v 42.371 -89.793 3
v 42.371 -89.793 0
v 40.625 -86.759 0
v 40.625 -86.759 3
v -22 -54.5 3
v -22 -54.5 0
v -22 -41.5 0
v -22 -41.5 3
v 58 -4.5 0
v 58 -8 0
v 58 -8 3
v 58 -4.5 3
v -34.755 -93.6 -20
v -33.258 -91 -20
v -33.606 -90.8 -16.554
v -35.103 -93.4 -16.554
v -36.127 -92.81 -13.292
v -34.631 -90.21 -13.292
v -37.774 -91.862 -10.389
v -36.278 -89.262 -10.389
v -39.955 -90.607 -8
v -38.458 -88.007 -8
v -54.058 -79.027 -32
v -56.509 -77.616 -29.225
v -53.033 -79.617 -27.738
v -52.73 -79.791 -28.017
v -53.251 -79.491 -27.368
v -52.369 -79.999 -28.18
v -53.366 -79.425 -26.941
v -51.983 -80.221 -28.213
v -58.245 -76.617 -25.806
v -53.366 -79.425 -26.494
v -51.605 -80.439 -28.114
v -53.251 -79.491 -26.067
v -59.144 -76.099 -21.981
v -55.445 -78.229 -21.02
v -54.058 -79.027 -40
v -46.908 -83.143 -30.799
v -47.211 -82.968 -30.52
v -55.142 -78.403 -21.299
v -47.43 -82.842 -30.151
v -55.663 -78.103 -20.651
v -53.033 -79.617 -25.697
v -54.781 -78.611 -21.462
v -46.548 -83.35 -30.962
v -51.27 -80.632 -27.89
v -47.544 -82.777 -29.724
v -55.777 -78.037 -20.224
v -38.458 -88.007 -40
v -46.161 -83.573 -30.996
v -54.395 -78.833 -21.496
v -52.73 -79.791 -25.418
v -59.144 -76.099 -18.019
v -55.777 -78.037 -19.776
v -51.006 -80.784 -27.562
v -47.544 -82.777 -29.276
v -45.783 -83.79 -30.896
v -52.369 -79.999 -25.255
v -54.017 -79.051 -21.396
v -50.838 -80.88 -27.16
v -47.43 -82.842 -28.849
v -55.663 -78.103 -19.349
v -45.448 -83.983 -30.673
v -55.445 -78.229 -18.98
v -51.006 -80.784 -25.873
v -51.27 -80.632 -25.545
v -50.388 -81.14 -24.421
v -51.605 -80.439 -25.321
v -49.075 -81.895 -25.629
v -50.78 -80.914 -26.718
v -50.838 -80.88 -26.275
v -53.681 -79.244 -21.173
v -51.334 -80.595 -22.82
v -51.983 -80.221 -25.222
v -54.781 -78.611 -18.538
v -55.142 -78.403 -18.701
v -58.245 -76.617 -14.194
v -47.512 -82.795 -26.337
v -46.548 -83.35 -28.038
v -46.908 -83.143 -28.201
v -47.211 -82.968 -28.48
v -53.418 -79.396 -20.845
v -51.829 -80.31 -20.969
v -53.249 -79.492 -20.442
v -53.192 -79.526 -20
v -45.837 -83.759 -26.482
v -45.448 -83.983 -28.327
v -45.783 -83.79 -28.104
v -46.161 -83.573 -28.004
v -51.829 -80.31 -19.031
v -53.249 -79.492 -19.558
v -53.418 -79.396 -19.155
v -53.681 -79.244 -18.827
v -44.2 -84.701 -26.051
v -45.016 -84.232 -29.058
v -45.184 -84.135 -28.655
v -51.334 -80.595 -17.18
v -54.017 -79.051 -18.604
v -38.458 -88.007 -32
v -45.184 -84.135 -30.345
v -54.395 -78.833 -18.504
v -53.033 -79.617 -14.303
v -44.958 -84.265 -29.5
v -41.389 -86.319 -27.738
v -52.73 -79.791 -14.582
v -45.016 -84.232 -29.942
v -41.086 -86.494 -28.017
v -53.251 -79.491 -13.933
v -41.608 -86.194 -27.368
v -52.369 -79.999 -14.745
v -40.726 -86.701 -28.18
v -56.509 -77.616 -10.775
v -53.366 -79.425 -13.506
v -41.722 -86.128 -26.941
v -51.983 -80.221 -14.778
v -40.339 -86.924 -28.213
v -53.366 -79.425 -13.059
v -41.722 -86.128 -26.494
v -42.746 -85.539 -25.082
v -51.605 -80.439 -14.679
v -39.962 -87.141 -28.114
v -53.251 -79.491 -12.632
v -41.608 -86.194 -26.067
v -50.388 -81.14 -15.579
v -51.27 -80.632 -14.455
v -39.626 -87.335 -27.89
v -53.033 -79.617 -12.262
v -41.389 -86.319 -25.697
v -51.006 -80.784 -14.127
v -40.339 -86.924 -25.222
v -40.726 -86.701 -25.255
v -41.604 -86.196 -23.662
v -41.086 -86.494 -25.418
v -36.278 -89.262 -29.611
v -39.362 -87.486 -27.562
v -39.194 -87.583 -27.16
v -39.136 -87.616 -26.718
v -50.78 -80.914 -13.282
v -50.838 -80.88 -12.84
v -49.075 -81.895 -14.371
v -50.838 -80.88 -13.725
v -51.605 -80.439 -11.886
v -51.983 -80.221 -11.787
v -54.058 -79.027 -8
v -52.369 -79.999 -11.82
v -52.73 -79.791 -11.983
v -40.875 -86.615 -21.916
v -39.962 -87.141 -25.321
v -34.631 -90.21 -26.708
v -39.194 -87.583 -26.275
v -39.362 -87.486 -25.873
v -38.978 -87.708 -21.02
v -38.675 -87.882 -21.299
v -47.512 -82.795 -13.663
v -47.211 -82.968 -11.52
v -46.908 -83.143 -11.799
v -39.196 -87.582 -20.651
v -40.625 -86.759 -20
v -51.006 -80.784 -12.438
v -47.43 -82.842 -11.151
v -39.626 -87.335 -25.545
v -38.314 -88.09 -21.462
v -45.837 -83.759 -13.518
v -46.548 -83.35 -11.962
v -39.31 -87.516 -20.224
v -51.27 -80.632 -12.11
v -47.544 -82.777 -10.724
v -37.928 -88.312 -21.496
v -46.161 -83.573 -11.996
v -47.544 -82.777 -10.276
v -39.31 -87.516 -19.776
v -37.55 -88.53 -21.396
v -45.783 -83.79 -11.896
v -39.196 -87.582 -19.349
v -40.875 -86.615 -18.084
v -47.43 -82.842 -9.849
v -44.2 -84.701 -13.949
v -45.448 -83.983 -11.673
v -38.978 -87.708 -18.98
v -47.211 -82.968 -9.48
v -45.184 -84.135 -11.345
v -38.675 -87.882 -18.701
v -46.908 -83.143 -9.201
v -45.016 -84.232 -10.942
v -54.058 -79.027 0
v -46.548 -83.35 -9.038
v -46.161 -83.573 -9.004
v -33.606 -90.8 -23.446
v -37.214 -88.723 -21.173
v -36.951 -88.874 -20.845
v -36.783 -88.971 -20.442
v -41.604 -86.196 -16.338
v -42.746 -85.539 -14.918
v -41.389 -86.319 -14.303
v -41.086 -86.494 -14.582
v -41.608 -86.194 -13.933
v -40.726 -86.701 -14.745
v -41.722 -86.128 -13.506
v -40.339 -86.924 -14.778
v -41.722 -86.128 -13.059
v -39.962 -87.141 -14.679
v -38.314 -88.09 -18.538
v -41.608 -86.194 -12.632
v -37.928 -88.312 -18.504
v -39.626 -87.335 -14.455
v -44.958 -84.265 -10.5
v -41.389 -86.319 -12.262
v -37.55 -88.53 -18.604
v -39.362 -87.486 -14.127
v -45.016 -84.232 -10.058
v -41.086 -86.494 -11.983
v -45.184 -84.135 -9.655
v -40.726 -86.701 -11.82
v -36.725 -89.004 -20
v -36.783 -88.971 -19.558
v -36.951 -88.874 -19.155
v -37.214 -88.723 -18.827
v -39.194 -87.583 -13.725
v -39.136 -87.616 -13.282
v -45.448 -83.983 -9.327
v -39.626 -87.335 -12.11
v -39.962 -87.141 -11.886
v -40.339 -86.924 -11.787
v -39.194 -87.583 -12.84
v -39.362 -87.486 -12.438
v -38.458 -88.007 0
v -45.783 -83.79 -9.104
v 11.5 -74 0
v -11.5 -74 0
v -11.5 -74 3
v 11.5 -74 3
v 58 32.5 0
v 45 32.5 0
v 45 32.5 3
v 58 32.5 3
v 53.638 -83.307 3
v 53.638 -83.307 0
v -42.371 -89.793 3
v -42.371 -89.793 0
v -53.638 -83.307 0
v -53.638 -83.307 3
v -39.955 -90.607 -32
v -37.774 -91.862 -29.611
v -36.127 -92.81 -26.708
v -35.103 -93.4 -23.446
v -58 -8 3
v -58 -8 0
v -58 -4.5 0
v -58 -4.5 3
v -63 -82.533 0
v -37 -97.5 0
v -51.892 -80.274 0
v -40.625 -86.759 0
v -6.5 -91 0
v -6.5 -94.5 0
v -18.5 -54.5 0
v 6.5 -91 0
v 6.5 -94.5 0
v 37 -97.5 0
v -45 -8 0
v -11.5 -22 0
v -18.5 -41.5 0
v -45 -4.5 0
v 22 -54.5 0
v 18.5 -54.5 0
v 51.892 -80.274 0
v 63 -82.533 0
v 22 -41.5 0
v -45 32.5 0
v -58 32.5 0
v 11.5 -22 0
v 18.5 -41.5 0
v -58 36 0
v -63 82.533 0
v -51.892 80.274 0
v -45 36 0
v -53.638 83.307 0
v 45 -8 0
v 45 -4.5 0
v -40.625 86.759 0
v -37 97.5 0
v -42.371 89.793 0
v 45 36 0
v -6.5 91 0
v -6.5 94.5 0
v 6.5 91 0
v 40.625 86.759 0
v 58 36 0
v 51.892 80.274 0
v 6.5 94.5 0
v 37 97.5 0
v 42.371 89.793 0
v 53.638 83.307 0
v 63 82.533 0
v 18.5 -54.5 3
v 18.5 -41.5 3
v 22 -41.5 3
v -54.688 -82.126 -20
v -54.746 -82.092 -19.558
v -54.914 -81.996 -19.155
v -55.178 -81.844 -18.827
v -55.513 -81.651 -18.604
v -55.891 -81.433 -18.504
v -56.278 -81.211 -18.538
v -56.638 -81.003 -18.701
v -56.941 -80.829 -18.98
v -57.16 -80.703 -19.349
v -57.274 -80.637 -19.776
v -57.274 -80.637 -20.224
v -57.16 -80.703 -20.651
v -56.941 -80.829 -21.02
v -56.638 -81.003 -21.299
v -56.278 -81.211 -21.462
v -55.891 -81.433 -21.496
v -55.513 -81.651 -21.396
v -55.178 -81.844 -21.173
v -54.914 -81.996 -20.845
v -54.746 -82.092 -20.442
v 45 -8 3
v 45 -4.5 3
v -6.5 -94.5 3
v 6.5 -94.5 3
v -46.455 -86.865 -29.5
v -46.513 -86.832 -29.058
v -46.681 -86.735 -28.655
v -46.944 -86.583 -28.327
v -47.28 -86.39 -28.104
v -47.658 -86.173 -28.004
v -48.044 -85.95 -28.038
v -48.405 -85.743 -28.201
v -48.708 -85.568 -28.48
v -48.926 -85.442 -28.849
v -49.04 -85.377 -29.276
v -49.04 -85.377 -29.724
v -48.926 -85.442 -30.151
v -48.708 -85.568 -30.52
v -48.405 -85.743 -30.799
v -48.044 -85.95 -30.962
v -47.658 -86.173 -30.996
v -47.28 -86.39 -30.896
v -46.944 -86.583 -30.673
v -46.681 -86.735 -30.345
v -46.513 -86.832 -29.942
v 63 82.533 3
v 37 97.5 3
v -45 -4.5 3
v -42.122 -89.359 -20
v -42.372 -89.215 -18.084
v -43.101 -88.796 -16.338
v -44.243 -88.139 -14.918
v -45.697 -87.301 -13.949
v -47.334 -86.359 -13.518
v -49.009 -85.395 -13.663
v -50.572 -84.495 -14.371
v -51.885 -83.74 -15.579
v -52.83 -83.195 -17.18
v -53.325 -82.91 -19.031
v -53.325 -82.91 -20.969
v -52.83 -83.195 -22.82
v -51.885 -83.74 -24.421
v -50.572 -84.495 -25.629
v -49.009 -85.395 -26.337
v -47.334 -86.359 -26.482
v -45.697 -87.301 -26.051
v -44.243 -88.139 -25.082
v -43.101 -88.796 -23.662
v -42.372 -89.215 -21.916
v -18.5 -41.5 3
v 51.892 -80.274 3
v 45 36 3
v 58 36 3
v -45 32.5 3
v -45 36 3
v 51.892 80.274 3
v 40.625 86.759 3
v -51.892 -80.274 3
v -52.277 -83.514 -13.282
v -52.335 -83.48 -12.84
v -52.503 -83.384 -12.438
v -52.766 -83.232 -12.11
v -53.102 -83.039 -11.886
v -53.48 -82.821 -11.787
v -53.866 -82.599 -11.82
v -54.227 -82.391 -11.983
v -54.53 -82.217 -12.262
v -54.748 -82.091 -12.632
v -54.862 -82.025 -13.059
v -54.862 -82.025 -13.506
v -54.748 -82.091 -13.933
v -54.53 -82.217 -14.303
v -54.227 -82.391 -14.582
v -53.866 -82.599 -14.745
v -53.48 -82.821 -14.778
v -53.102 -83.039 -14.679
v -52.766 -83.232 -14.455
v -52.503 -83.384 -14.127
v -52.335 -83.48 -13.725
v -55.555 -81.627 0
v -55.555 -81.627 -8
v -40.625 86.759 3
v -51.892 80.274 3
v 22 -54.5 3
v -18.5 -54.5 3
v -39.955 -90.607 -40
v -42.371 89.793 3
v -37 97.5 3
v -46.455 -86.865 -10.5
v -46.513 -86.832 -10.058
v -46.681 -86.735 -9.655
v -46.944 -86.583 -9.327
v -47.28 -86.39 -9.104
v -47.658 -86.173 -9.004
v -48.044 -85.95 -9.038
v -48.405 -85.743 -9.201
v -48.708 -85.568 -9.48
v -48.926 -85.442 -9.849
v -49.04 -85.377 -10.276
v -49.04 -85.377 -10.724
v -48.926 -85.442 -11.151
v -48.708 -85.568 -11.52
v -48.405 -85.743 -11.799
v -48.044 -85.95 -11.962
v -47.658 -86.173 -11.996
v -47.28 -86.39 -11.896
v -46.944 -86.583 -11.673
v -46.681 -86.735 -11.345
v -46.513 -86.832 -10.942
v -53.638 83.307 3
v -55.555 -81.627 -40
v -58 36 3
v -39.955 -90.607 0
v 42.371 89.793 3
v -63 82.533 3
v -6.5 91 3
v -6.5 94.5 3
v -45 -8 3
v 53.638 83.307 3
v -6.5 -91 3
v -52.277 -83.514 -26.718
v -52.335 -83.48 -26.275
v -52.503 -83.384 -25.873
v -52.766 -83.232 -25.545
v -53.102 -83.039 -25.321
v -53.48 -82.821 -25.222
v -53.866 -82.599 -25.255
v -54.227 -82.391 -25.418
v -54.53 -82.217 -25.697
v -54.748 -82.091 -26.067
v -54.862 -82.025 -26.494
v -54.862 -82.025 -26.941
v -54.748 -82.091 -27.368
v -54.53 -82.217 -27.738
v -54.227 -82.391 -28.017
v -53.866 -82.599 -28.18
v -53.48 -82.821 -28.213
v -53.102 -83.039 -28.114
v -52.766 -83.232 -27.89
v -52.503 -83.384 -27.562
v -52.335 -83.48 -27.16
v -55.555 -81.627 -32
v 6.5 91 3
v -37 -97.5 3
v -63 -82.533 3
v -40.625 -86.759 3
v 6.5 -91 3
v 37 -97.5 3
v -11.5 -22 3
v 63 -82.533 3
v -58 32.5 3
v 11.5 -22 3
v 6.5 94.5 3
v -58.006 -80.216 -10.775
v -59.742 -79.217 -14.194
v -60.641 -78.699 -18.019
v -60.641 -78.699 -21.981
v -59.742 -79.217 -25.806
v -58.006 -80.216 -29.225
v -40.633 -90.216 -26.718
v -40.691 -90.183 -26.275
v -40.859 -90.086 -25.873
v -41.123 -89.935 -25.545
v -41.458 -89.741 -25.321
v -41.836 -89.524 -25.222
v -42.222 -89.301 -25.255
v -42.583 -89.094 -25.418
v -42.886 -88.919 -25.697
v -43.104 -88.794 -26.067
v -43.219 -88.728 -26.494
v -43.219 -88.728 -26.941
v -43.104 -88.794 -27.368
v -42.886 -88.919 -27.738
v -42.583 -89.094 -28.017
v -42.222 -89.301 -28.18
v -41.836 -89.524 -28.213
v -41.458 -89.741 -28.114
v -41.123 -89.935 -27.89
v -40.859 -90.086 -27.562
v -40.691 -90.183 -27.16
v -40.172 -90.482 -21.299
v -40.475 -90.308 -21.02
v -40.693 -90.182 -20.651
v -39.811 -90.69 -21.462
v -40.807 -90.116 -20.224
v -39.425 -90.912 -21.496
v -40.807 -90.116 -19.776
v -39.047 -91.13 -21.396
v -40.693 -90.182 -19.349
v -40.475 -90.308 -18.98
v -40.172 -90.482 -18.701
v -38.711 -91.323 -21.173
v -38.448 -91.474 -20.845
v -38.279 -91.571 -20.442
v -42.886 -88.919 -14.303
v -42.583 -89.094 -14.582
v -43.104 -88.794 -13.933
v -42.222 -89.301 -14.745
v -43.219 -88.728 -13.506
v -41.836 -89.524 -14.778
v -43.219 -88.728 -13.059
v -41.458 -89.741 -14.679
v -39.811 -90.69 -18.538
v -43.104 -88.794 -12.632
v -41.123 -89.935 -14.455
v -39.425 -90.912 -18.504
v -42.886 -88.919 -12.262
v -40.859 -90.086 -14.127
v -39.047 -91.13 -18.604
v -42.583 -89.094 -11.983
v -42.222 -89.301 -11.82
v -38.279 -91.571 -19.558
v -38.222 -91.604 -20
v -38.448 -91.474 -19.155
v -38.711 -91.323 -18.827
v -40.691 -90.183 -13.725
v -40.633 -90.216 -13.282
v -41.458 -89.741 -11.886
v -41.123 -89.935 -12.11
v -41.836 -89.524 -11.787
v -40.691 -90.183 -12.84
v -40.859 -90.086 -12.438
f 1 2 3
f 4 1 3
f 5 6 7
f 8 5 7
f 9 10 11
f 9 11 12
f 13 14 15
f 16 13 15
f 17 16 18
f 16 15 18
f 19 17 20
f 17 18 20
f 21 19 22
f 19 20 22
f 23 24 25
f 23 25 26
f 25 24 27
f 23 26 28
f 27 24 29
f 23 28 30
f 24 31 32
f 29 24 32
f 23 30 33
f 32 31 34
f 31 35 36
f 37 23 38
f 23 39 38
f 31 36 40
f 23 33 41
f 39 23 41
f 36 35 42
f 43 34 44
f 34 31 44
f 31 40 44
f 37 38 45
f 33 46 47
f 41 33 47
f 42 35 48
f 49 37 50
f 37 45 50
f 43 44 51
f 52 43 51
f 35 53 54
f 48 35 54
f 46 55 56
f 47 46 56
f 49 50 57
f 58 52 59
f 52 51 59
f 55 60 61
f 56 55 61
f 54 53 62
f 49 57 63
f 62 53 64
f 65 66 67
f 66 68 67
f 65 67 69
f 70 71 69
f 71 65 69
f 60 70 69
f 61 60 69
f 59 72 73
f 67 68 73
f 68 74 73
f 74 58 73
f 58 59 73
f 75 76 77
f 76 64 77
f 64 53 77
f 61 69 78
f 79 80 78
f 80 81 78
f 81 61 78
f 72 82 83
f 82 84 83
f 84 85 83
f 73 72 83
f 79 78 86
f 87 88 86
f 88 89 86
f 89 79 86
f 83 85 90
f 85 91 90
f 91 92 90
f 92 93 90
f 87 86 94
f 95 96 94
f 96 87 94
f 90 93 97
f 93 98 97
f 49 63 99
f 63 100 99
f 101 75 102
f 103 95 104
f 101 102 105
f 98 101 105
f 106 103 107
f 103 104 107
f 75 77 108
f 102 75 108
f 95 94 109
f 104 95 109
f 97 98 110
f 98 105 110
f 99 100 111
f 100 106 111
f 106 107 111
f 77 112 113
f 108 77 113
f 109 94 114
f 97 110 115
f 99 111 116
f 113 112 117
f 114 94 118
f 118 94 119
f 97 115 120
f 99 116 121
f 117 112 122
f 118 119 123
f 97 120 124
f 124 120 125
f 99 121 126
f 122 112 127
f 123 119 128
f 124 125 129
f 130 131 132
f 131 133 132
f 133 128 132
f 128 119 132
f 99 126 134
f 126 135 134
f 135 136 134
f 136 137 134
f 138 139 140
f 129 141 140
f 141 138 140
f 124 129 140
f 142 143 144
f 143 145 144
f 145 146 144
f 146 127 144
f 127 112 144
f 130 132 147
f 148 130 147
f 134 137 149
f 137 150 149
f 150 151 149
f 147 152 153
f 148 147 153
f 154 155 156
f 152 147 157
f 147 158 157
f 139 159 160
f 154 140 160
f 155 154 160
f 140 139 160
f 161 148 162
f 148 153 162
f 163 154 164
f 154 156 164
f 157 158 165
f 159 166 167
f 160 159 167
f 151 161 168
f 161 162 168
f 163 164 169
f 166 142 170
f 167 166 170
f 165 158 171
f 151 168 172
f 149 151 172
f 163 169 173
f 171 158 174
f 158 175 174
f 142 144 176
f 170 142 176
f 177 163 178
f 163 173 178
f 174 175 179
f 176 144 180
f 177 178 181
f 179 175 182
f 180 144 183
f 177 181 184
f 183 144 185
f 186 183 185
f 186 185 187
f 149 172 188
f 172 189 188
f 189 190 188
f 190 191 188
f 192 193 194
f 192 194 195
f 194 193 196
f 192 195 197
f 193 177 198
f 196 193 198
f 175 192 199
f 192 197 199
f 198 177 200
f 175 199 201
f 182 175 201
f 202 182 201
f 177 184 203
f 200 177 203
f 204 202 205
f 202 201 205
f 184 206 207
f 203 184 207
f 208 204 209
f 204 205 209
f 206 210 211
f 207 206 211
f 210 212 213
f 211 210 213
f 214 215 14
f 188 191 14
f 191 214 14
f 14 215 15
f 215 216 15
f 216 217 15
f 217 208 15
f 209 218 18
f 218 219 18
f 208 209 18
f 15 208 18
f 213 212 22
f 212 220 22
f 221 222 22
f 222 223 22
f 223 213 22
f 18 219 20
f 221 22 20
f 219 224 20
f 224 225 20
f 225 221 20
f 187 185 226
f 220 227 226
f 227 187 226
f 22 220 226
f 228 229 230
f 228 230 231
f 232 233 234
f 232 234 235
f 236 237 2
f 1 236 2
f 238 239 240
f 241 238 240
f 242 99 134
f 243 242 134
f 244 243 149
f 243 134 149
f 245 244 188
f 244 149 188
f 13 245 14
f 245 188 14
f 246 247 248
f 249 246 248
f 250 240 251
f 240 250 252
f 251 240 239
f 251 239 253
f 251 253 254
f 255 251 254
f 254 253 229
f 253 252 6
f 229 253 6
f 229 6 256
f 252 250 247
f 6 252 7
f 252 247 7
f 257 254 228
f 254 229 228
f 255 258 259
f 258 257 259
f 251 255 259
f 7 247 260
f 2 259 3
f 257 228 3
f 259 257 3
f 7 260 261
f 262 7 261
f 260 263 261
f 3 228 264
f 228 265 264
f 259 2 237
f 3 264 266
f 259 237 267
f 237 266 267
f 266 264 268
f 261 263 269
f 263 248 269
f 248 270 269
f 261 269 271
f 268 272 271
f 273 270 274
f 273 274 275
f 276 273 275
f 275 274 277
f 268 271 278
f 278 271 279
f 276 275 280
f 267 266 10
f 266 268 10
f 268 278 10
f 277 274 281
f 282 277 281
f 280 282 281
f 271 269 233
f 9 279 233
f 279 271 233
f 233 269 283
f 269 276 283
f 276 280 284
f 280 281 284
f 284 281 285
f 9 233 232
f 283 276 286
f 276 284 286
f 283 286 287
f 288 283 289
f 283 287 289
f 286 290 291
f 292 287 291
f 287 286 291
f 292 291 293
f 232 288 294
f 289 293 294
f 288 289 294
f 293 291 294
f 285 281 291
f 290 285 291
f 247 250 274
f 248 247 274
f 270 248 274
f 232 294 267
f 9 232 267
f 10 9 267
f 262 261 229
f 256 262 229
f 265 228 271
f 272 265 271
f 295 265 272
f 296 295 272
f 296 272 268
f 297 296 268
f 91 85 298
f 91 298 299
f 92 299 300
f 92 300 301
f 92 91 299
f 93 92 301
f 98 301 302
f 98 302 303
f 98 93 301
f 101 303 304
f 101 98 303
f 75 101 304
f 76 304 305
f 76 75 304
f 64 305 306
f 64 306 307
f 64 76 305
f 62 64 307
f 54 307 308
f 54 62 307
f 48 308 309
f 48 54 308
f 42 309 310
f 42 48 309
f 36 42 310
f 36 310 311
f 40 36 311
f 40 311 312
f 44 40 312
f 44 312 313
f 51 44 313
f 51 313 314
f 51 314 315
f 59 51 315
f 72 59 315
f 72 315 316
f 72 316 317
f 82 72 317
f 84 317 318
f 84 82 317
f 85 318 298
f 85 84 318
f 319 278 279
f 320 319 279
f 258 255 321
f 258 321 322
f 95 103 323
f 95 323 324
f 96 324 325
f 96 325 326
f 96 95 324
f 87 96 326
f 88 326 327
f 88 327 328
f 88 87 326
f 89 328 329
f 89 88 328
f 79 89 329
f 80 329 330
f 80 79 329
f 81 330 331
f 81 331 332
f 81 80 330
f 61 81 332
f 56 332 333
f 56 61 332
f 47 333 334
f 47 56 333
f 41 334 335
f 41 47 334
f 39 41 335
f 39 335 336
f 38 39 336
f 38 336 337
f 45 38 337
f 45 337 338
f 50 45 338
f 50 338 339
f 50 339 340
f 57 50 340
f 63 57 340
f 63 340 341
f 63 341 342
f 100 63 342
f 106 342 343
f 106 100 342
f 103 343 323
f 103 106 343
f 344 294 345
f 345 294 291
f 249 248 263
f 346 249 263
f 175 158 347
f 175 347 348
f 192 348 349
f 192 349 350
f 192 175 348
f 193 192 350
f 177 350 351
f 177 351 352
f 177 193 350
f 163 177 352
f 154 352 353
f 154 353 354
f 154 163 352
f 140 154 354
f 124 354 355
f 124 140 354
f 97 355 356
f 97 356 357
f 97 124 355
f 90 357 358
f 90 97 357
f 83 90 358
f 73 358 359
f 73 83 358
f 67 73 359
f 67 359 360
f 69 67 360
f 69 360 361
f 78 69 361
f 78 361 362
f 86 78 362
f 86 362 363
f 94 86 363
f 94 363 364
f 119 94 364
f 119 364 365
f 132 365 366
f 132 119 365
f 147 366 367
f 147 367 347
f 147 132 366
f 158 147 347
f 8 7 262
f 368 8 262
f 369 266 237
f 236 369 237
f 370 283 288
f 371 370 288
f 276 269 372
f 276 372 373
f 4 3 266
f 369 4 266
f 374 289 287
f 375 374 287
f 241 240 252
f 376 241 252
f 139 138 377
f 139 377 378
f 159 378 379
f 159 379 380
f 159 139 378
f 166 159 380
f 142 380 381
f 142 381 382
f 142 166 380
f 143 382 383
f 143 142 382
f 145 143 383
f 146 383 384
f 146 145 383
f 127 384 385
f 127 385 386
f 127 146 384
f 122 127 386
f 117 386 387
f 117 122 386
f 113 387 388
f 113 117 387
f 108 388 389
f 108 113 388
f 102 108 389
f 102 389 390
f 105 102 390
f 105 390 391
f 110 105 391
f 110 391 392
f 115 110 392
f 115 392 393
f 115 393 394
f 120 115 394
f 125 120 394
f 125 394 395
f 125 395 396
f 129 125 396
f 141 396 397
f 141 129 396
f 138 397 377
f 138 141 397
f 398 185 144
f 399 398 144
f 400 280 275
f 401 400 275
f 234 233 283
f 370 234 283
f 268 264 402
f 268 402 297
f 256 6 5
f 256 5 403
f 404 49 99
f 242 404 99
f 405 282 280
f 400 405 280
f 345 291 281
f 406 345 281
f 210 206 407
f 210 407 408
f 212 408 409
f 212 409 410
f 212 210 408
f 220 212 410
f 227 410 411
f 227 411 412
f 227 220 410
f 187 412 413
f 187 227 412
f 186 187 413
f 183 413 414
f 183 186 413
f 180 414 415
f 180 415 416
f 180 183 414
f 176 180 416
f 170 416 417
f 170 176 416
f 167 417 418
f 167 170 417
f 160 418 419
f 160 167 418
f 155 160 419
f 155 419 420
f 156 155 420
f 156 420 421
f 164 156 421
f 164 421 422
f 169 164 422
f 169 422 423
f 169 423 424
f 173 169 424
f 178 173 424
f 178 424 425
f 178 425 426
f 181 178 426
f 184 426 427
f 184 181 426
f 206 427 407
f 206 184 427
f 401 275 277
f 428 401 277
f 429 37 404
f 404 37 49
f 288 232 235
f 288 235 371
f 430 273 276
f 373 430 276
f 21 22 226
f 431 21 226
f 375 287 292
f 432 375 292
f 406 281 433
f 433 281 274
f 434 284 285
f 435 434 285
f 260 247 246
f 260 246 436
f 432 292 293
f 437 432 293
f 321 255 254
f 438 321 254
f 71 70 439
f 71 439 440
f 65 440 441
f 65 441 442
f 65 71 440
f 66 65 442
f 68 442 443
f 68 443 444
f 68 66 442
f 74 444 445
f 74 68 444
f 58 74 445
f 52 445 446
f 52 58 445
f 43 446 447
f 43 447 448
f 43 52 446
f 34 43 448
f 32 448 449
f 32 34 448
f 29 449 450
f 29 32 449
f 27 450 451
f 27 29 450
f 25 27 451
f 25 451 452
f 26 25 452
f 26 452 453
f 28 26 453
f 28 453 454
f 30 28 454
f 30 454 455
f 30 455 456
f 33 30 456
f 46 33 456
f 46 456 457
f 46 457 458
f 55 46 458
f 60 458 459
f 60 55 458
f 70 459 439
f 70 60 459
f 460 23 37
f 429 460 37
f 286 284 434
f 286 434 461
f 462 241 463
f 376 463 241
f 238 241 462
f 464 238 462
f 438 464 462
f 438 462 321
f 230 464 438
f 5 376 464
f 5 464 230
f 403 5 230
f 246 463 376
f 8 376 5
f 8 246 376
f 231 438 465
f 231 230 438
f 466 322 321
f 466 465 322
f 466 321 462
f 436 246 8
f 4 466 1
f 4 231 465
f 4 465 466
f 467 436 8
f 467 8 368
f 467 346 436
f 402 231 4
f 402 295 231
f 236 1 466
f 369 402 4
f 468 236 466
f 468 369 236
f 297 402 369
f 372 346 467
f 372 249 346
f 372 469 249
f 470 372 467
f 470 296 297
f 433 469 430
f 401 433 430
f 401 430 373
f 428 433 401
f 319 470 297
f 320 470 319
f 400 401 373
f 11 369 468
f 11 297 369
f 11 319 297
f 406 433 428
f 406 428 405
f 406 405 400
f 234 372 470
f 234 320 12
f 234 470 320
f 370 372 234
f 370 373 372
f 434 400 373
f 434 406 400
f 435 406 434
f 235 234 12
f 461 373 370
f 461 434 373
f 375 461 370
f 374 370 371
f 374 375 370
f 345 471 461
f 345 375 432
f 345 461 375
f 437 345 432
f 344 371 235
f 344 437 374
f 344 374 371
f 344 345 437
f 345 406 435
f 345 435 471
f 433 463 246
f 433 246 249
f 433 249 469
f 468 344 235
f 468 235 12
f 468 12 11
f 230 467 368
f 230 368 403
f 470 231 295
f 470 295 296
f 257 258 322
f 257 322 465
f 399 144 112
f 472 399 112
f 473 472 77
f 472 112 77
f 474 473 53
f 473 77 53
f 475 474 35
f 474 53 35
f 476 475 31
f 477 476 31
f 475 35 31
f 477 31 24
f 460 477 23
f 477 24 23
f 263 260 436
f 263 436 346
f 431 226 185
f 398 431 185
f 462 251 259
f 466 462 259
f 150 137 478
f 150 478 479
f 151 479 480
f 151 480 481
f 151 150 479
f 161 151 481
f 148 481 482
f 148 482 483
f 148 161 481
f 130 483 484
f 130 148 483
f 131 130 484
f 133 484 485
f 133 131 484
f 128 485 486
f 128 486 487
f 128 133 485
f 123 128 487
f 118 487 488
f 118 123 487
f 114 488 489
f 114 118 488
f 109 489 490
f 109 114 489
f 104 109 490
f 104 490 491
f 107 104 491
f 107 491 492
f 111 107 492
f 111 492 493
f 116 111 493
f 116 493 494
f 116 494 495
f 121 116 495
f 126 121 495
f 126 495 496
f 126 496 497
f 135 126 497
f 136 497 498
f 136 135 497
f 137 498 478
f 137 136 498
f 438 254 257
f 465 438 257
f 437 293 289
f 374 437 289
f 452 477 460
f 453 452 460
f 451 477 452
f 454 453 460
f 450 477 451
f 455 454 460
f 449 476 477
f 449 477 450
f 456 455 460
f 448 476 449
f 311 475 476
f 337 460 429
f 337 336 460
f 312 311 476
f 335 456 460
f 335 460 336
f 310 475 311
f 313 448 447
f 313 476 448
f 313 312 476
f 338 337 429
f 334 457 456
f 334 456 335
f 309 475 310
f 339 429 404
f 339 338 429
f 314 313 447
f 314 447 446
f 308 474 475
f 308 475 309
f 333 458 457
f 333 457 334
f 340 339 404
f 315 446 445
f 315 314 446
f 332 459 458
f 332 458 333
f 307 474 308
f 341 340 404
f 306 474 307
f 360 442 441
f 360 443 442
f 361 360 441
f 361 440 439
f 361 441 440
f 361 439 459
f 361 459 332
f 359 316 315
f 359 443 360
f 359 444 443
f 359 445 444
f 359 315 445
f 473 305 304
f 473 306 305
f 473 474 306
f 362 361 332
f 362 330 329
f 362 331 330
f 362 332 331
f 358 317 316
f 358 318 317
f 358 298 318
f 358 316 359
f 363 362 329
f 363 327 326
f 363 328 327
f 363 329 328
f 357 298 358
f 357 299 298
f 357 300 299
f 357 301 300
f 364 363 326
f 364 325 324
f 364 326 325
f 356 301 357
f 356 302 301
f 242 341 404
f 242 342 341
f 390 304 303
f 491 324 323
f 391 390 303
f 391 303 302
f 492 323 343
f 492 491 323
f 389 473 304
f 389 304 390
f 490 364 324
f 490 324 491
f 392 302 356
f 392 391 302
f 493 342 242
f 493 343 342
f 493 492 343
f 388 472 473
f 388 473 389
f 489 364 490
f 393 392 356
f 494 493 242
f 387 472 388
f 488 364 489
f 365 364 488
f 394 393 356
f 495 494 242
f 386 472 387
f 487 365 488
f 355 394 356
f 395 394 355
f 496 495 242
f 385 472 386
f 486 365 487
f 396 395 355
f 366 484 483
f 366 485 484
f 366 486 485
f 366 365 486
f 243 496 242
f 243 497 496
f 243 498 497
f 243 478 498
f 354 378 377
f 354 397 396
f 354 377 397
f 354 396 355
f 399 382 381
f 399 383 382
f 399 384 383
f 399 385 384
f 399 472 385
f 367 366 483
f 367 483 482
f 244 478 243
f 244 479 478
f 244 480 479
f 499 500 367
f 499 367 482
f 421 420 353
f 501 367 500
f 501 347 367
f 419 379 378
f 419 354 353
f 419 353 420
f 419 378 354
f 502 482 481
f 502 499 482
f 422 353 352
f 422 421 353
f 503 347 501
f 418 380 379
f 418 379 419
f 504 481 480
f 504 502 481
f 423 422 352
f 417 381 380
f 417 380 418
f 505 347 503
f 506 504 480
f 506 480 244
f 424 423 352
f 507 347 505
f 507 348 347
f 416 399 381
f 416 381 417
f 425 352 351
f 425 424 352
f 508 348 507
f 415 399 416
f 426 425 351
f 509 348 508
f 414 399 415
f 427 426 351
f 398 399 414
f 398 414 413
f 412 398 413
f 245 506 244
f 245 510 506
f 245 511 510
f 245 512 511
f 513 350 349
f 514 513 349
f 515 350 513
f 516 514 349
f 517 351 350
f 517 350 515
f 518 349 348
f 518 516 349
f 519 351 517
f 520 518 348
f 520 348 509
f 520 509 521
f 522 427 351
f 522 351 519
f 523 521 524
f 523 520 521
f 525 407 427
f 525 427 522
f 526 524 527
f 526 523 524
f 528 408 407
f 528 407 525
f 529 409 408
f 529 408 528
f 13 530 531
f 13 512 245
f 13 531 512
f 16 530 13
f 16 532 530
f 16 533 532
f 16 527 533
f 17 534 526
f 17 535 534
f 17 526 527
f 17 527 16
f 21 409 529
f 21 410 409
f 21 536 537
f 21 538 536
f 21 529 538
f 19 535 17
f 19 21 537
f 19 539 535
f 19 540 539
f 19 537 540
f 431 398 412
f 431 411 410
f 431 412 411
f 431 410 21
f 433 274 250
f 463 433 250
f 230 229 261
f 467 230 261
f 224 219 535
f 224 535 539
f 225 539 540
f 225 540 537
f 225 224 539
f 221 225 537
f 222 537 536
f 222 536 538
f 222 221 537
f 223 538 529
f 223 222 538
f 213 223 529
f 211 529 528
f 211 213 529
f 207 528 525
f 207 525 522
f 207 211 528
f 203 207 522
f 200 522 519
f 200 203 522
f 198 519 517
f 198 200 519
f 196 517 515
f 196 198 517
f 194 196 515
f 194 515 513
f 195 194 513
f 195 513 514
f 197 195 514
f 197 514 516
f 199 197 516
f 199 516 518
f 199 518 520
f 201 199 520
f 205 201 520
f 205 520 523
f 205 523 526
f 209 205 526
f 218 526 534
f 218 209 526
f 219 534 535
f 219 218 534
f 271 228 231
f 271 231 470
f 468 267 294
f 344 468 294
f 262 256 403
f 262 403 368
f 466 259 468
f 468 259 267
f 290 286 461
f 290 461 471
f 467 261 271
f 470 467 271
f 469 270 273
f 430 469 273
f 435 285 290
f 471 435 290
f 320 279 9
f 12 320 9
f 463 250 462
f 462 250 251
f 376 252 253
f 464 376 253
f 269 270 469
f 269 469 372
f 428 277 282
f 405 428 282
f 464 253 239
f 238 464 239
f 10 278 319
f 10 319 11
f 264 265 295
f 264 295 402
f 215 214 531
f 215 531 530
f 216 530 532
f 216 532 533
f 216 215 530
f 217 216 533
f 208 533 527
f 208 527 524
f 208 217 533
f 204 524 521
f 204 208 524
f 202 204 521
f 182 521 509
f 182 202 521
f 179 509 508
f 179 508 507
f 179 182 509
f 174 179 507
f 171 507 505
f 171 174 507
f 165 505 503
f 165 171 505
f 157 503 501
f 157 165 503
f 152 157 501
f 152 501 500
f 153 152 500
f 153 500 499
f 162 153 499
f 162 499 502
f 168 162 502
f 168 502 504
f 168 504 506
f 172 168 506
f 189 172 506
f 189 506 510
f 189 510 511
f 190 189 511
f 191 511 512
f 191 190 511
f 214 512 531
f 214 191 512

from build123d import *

# Parameters (mm, degrees)
F0_W     = 13
F0_H     = 3.5
F0_W_2   = 3.5
F0_H_2   = 13
F0_W_3   = 23
F0_H_3   = 52
F1_DEPTH = 3
F2_R     = 1.5
F2_R_2   = 6.5
F3_DEPTH = 3


with BuildPart() as f1:
    # F0 (on Top) → F1 (new body)
    with BuildSketch(Plane.XY):
        Polygon((37, 97.5), (-37, 97.5), (-63, 82.53337), (-63, -82.53337), (-37, -97.5), (37, -97.5), (63, -82.53337), (63, 82.53337), align=None)
        Polygon((-40.625009, -86.759455), (-42.371116, -89.792788), (-53.637783, -83.307249), (-51.891676, -80.273915), align=None, mode=Mode.SUBTRACT)
        with Locations((-51.5, -6.25)):
            Rectangle(F0_W, F0_H, mode=Mode.SUBTRACT)
        with Locations((-20.25, -48)):
            Rectangle(F0_W_2, F0_H_2, mode=Mode.SUBTRACT)
        with Locations((0, -92.75)):
            Rectangle(F0_W, F0_H, mode=Mode.SUBTRACT)
        Polygon((53.637783, -83.307249), (42.371116, -89.792788), (40.625009, -86.759455), (51.891676, -80.273915), align=None, mode=Mode.SUBTRACT)
        with Locations((0, -48)):
            Rectangle(F0_W_3, F0_H_3, mode=Mode.SUBTRACT)
        with Locations((20.25, -48)):
            Rectangle(F0_W_2, F0_H_2, mode=Mode.SUBTRACT)
        with Locations((51.5, -6.25)):
            Rectangle(F0_W, F0_H, mode=Mode.SUBTRACT)
        with Locations((-51.5, 34.25)):
            Rectangle(F0_W, F0_H, mode=Mode.SUBTRACT)
        Polygon((-53.637783, 83.307249), (-42.371116, 89.792788), (-40.625009, 86.759455), (-51.891676, 80.273915), align=None, mode=Mode.SUBTRACT)
        with Locations((51.5, 34.25)):
            Rectangle(F0_W, F0_H, mode=Mode.SUBTRACT)
        with Locations((0, 92.75)):
            Rectangle(F0_W, F0_H, mode=Mode.SUBTRACT)
        Polygon((40.625009, 86.759455), (42.371116, 89.792788), (53.637783, 83.307249), (51.891676, 80.273915), align=None, mode=Mode.SUBTRACT)
    extrude(amount=F1_DEPTH)


with BuildPart() as f3:
    # F2 (on face) → F3 (new body)
    with BuildSketch(Plane(origin=(-47.623238, -82.730997, 0), x_dir=(0.866667, -0.498888, 0), z_dir=(-0.498888, -0.866667, 0))):
        with BuildLine():
            ThreePointArc((-7.425121, -8), (1.574879, -5), (10.574879, -8))
            Line((10.574879, -8), (10.574879, 0))
            Line((10.574879, 0), (8.074879, 0))
            Line((8.074879, 0), (-4.925121, 0))
            Line((-4.925121, 0), (-7.425121, 0))
            Line((-7.425121, 0), (-7.425121, -8))
        make_face()
        with BuildLine():
            Line((-7.425121, -8), (10.574879, -8))
            ThreePointArc((10.574879, -8), (1.574879, -5), (-7.425121, -8))
        make_face()
        with BuildLine():
            ThreePointArc((10.574879, -32), (14.991287, -26.708204), (16.574879, -20))
            ThreePointArc((16.574879, -20), (14.991287, -13.291796), (10.574879, -8))
            Line((10.574879, -8), (-7.425121, -8))
            ThreePointArc((-7.425121, -8), (-13.425121, -20), (-7.425121, -32))
            Line((-7.425121, -32), (10.574879, -32))
        make_face()
        with Locations((1.574879, -29.5)):
            Circle(F2_R, mode=Mode.SUBTRACT)
        with Locations((-7.925121, -20)):
            Circle(F2_R, mode=Mode.SUBTRACT)
        with Locations((-5.142635, -26.717514)):
            Circle(F2_R, mode=Mode.SUBTRACT)
        with Locations((8.292394, -26.717514)):
            Circle(F2_R, mode=Mode.SUBTRACT)
        with Locations((1.574879, -20)):
            Circle(F2_R_2, mode=Mode.SUBTRACT)
        with Locations((11.074879, -20)):
            Circle(F2_R, mode=Mode.SUBTRACT)
        with Locations((-5.142635, -13.282486)):
            Circle(F2_R, mode=Mode.SUBTRACT)
        with Locations((8.292394, -13.282486)):
            Circle(F2_R, mode=Mode.SUBTRACT)
        with Locations((1.574879, -10.5)):
            Circle(F2_R, mode=Mode.SUBTRACT)
        with BuildLine():
            ThreePointArc((-7.425121, -32), (1.574879, -35), (10.574879, -32))
            Line((10.574879, -32), (-7.425121, -32))
        make_face()
        with BuildLine():
            Line((10.574879, -40), (10.574879, -32))
            ThreePointArc((10.574879, -32), (1.574879, -35), (-7.425121, -32))
            Line((-7.425121, -32), (-7.425121, -40))
            Line((-7.425121, -40), (10.574879, -40))
        make_face()
    extrude(amount=F3_DEPTH)


solid = Compound([f1.part, f3.part])
